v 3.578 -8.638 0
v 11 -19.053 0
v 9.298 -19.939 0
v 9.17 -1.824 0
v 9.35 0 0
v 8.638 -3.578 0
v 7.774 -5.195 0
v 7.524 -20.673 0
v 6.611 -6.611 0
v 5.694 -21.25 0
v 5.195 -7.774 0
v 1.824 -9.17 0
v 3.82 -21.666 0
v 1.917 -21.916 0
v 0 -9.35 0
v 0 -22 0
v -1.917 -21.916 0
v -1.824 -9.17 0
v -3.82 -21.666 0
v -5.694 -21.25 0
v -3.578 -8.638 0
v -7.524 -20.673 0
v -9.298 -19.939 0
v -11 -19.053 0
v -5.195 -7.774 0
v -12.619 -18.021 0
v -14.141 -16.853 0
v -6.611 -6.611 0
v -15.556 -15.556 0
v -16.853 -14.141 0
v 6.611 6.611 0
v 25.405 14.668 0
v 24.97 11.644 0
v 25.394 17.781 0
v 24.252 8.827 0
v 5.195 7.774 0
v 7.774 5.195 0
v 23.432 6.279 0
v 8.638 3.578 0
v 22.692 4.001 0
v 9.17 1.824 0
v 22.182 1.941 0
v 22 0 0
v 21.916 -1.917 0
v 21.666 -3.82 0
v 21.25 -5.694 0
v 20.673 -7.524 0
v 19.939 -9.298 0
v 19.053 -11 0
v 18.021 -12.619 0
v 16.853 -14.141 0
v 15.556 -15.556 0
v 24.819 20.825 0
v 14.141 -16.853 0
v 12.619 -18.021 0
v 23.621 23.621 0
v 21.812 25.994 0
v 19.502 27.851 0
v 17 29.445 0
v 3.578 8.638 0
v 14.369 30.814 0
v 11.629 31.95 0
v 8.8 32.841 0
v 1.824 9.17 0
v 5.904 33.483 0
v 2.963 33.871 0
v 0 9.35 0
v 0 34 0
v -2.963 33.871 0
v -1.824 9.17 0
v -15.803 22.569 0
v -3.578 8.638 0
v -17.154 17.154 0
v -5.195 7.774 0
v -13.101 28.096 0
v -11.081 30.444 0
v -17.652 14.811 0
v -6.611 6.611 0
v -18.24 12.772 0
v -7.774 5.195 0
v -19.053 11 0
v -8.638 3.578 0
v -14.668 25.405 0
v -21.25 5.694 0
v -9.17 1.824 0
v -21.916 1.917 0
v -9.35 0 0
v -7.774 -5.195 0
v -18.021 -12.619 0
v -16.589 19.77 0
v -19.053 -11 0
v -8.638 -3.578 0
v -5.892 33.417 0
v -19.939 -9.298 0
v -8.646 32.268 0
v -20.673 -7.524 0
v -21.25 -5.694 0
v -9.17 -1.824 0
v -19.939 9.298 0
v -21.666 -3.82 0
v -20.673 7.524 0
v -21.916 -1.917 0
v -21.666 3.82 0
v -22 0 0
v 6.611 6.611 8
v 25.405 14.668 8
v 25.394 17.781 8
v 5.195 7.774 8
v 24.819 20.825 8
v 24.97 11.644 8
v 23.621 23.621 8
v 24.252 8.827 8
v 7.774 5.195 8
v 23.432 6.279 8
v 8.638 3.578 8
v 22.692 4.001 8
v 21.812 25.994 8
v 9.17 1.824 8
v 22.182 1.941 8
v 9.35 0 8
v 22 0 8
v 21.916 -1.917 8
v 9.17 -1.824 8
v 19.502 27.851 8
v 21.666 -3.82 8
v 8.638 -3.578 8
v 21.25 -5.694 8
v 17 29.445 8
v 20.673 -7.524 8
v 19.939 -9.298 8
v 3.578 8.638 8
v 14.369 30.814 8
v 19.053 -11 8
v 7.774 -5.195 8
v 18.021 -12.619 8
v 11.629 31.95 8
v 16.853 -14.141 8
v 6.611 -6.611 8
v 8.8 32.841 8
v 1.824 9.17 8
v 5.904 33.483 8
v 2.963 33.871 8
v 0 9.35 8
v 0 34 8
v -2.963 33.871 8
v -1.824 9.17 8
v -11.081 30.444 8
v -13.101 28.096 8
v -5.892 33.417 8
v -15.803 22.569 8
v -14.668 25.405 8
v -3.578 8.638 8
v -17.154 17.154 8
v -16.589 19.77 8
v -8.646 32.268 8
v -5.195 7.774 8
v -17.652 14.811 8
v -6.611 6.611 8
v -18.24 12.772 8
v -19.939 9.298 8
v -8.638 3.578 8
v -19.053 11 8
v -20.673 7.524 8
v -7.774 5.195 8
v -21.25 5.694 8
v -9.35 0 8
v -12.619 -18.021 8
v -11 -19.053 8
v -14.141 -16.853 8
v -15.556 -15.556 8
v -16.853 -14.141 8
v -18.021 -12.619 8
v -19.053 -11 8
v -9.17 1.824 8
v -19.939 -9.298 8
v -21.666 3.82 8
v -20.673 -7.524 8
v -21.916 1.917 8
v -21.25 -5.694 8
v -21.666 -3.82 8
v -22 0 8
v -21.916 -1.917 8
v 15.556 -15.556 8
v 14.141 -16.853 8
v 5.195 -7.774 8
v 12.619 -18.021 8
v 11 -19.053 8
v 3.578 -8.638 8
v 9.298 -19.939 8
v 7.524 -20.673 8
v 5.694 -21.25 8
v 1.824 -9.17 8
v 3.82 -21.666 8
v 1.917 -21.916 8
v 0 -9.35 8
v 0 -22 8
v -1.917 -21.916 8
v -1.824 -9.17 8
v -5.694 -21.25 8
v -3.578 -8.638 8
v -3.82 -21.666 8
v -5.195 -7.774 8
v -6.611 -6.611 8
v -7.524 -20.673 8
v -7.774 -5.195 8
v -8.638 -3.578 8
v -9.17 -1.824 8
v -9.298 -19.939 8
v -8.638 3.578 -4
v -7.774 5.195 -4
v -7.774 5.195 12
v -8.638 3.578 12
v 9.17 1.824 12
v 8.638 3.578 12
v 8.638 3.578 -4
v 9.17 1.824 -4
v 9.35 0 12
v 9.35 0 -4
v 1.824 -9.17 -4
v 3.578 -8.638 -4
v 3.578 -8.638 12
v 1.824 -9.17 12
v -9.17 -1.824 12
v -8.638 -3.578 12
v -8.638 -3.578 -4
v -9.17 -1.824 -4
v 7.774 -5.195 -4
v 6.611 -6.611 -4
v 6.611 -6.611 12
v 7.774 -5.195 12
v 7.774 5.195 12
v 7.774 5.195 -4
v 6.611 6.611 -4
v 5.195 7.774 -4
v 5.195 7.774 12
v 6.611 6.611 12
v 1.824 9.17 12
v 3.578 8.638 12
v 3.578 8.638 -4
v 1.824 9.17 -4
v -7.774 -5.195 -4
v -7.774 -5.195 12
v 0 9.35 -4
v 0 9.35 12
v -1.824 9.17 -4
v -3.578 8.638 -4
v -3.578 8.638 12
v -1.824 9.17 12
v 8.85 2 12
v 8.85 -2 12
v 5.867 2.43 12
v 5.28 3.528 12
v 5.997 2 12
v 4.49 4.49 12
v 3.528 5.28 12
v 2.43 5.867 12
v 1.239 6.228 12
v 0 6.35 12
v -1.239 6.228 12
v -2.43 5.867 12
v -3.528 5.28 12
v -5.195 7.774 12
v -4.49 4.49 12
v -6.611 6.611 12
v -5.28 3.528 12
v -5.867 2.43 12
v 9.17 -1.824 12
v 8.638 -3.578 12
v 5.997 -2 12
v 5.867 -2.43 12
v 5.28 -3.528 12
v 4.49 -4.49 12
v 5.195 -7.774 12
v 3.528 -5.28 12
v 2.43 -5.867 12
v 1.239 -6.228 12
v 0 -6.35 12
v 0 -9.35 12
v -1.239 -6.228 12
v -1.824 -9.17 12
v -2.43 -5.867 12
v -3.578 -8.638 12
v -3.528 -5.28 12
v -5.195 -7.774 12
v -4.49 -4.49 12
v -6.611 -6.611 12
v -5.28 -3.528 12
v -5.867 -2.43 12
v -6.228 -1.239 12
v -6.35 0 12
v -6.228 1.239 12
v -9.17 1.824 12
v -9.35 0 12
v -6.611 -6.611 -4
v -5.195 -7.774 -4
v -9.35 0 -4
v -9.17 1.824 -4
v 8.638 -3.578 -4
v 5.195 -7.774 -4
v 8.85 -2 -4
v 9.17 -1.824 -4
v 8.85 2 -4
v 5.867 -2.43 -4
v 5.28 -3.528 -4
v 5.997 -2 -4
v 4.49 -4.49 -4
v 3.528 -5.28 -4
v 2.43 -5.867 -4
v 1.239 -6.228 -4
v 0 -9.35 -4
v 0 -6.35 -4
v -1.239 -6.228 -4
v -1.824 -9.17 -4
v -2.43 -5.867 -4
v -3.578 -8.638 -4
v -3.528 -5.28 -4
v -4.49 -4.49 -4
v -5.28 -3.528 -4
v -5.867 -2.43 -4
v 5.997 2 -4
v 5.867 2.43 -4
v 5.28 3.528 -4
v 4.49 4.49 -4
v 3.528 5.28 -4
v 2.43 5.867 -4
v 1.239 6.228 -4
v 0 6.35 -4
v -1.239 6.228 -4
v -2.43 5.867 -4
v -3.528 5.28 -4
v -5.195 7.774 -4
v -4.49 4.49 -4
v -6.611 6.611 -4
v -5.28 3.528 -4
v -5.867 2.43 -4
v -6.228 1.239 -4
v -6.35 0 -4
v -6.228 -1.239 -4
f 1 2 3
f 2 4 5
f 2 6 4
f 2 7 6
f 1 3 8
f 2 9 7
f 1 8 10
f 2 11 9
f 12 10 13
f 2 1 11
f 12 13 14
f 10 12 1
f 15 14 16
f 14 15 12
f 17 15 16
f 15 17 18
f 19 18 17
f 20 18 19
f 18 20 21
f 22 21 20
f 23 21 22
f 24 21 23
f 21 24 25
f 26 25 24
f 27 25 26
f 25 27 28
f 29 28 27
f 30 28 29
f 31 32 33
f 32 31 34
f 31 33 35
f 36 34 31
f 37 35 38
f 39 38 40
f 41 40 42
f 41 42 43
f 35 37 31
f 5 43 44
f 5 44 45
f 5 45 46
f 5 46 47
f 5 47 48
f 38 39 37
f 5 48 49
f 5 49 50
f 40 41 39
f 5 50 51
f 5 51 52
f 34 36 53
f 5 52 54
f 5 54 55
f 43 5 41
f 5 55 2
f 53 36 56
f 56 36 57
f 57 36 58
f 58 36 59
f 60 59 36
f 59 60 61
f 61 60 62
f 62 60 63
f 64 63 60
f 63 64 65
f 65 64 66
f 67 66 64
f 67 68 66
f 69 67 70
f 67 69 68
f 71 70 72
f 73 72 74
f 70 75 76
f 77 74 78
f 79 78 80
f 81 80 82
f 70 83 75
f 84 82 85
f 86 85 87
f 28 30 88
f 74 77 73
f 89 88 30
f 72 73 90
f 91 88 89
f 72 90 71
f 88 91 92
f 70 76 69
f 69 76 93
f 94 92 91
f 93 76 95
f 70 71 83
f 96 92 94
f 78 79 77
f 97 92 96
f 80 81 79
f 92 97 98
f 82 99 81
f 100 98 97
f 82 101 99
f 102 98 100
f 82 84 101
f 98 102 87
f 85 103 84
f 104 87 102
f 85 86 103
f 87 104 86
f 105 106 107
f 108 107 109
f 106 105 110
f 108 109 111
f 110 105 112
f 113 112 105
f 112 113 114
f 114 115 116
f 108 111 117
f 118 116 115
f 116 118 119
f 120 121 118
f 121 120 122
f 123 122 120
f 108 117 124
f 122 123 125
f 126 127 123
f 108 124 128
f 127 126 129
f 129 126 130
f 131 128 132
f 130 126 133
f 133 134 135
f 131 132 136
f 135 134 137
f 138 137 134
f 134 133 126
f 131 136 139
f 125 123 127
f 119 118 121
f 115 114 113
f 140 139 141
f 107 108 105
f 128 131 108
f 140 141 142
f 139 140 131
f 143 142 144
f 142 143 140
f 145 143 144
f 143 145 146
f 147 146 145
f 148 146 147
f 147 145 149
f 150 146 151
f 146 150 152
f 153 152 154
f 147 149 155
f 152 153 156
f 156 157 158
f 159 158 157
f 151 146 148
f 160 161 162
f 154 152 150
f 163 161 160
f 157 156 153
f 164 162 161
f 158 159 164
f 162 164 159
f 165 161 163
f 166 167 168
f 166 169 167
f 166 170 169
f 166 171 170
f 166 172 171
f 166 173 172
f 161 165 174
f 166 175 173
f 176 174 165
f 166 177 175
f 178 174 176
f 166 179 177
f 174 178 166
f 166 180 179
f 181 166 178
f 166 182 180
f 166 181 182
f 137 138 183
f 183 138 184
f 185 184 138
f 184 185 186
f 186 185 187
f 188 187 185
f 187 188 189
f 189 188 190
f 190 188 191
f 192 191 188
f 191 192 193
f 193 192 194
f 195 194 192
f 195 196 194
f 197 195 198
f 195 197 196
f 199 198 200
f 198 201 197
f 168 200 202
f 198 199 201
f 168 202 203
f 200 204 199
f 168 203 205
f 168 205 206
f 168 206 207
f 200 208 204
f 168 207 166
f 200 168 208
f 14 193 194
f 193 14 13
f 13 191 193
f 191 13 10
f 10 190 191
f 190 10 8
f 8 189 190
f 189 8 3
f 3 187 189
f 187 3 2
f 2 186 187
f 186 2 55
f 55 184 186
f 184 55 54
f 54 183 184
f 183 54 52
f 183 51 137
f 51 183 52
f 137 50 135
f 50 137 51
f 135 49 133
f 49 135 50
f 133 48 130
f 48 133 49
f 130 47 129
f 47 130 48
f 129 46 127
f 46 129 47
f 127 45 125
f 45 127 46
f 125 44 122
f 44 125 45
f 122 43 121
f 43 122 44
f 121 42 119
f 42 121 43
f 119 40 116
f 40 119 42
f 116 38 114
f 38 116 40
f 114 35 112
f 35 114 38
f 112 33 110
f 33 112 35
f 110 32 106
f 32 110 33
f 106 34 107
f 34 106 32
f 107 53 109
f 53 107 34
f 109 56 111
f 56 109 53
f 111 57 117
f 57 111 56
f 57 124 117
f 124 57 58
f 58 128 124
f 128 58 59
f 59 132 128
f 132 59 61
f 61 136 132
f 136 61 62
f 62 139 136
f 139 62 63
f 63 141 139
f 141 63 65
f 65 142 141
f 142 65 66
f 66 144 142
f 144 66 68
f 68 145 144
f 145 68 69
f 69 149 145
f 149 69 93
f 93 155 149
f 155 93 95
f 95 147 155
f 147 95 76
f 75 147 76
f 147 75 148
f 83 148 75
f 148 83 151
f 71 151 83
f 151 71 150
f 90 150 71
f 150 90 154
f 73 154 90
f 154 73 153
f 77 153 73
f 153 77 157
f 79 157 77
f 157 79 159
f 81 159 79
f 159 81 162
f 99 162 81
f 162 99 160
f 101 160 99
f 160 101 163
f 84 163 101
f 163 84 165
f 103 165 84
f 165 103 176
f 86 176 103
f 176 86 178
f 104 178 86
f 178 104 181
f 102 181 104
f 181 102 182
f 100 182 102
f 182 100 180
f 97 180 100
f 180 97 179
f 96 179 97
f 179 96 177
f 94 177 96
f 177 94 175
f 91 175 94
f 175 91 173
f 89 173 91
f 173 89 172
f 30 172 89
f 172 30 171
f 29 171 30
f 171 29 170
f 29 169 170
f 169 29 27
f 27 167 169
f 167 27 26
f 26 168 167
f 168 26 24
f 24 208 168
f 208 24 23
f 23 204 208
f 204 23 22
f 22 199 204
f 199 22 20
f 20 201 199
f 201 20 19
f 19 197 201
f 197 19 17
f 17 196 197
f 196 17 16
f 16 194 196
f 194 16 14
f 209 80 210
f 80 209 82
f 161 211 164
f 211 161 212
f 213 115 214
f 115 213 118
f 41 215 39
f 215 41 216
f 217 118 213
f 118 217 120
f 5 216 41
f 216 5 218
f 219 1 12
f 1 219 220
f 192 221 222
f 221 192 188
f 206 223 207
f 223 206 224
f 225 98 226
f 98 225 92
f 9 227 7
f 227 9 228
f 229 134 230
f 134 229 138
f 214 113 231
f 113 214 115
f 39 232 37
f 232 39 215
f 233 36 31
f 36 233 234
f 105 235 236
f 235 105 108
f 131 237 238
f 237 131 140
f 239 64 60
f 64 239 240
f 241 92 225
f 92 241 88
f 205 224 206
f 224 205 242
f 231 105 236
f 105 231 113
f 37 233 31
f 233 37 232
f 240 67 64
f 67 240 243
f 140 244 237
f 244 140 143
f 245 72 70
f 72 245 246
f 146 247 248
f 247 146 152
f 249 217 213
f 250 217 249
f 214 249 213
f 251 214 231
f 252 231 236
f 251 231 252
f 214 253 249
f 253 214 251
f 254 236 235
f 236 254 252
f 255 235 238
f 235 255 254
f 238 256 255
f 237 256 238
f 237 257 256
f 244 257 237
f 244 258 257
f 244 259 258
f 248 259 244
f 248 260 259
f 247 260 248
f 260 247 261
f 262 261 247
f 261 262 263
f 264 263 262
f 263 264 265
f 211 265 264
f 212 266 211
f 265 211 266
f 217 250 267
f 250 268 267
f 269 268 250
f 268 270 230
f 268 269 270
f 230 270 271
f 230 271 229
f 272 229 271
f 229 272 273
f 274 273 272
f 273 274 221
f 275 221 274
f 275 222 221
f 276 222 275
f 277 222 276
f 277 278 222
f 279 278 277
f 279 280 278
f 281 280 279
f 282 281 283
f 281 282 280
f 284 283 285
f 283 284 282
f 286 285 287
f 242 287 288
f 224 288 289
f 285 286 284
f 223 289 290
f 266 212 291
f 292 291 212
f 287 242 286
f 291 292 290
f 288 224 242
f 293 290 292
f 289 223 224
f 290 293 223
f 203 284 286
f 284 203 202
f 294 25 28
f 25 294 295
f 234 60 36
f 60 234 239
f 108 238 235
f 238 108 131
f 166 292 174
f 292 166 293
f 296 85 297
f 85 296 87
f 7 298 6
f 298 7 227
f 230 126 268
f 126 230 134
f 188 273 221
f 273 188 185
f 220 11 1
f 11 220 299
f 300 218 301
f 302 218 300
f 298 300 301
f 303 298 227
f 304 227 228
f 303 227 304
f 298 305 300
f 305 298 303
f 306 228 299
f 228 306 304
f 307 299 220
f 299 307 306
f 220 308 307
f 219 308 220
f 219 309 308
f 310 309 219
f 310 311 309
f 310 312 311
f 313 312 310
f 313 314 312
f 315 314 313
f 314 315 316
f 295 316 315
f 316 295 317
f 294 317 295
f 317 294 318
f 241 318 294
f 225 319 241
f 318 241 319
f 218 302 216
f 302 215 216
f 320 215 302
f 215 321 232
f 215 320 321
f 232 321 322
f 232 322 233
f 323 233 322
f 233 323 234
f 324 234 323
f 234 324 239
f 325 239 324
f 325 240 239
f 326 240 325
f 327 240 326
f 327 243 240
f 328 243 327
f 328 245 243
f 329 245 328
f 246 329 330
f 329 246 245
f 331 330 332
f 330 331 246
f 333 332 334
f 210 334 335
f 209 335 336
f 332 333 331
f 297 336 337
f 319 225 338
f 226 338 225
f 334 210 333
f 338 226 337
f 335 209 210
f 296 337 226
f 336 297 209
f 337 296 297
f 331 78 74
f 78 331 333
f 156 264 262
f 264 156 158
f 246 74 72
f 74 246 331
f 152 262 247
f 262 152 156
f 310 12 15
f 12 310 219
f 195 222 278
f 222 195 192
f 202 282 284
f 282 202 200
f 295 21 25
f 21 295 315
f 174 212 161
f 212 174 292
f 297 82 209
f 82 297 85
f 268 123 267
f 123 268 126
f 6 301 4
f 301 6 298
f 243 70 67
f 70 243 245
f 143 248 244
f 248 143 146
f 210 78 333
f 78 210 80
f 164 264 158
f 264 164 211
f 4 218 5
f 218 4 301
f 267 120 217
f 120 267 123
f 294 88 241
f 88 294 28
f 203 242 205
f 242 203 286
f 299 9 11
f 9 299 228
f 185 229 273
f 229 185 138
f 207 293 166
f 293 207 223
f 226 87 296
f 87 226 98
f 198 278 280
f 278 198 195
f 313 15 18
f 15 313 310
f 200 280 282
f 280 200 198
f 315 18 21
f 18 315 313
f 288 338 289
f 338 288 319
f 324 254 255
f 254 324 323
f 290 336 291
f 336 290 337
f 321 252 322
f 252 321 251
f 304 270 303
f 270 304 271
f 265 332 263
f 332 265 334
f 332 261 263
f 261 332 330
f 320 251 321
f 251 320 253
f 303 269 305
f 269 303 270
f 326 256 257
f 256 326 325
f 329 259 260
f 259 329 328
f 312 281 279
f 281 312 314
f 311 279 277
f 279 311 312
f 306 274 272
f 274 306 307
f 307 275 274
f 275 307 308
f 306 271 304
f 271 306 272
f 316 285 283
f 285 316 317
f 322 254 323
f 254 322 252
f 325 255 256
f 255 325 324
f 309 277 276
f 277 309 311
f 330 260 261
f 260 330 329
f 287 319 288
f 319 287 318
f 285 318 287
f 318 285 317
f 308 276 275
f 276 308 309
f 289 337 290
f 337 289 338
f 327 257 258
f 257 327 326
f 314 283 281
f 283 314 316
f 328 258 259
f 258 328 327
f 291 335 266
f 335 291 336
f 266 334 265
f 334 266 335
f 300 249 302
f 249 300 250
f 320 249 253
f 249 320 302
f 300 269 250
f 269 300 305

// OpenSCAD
$fn = 32;

// ----------------------------------------------------------------------
// Cam: base radius 22 mm with a 12 mm lift over 150 degrees
// ----------------------------------------------------------------------

// --- parameters (mm) ---
base_r = 22;              // base radius
lift = 12;                // lift height above the base radius
lift_span = 150;          // angular width of the lift
lift_start = 0;           // angle where the lift starts
cam_t = 8;                // cam plate thickness
hub_d = 18.7;             // hub diameter
hub_h = 16;               // hub height
bore_d = 12.7;            // bore
key_w = 4;                // keyway width
key_depth = 1.6;          // keyway depth

cam_profile = [[22, 0], [22.182, 1.941], [22.692, 4.001], [23.432, 6.279], [24.252, 8.827], [24.97, 11.644], [25.405, 14.668], [25.394, 17.781], [24.819, 20.825], [23.621, 23.621], [21.812, 25.994], [19.502, 27.851], [17, 29.445], [14.369, 30.814], [11.629, 31.95], [8.8, 32.841], [5.904, 33.483], [2.963, 33.871], [0, 34], [-2.963, 33.871], [-5.892, 33.417], [-8.646, 32.268], [-11.081, 30.444], [-13.101, 28.096], [-14.668, 25.405], [-15.803, 22.569], [-16.589, 19.77], [-17.154, 17.154], [-17.652, 14.811], [-18.24, 12.772], [-19.053, 11], [-19.939, 9.298], [-20.673, 7.524], [-21.25, 5.694], [-21.666, 3.82], [-21.916, 1.917], [-22, 0], [-21.916, -1.917], [-21.666, -3.82], [-21.25, -5.694], [-20.673, -7.524], [-19.939, -9.298], [-19.053, -11], [-18.021, -12.619], [-16.853, -14.141], [-15.556, -15.556], [-14.141, -16.853], [-12.619, -18.021], [-11, -19.053], [-9.298, -19.939], [-7.524, -20.673], [-5.694, -21.25], [-3.82, -21.666], [-1.917, -21.916], [0, -22], [1.917, -21.916], [3.82, -21.666], [5.694, -21.25], [7.524, -20.673], [9.298, -19.939], [11, -19.053], [12.619, -18.021], [14.141, -16.853], [15.556, -15.556], [16.853, -14.141], [18.021, -12.619], [19.053, -11], [19.939, -9.298], [20.673, -7.524], [21.25, -5.694], [21.666, -3.82], [21.916, -1.917]];

difference() {
  union() {
    linear_extrude(height = cam_t) polygon(cam_profile);
    /* hub, proud of the cam plate on both sides */
    translate([0, 0, -4]) cylinder(h = hub_h, d = hub_d);
  }
  /* bore through the hub, 2.5 mm clear on both faces */
  translate([0, 0, -6.5]) cylinder(h = hub_h + 5, d = bore_d);
  /* keyway, milled through the whole hub */
  translate([4.75, -2, -6.5]) cube([4.1, 4, 21]);
}
